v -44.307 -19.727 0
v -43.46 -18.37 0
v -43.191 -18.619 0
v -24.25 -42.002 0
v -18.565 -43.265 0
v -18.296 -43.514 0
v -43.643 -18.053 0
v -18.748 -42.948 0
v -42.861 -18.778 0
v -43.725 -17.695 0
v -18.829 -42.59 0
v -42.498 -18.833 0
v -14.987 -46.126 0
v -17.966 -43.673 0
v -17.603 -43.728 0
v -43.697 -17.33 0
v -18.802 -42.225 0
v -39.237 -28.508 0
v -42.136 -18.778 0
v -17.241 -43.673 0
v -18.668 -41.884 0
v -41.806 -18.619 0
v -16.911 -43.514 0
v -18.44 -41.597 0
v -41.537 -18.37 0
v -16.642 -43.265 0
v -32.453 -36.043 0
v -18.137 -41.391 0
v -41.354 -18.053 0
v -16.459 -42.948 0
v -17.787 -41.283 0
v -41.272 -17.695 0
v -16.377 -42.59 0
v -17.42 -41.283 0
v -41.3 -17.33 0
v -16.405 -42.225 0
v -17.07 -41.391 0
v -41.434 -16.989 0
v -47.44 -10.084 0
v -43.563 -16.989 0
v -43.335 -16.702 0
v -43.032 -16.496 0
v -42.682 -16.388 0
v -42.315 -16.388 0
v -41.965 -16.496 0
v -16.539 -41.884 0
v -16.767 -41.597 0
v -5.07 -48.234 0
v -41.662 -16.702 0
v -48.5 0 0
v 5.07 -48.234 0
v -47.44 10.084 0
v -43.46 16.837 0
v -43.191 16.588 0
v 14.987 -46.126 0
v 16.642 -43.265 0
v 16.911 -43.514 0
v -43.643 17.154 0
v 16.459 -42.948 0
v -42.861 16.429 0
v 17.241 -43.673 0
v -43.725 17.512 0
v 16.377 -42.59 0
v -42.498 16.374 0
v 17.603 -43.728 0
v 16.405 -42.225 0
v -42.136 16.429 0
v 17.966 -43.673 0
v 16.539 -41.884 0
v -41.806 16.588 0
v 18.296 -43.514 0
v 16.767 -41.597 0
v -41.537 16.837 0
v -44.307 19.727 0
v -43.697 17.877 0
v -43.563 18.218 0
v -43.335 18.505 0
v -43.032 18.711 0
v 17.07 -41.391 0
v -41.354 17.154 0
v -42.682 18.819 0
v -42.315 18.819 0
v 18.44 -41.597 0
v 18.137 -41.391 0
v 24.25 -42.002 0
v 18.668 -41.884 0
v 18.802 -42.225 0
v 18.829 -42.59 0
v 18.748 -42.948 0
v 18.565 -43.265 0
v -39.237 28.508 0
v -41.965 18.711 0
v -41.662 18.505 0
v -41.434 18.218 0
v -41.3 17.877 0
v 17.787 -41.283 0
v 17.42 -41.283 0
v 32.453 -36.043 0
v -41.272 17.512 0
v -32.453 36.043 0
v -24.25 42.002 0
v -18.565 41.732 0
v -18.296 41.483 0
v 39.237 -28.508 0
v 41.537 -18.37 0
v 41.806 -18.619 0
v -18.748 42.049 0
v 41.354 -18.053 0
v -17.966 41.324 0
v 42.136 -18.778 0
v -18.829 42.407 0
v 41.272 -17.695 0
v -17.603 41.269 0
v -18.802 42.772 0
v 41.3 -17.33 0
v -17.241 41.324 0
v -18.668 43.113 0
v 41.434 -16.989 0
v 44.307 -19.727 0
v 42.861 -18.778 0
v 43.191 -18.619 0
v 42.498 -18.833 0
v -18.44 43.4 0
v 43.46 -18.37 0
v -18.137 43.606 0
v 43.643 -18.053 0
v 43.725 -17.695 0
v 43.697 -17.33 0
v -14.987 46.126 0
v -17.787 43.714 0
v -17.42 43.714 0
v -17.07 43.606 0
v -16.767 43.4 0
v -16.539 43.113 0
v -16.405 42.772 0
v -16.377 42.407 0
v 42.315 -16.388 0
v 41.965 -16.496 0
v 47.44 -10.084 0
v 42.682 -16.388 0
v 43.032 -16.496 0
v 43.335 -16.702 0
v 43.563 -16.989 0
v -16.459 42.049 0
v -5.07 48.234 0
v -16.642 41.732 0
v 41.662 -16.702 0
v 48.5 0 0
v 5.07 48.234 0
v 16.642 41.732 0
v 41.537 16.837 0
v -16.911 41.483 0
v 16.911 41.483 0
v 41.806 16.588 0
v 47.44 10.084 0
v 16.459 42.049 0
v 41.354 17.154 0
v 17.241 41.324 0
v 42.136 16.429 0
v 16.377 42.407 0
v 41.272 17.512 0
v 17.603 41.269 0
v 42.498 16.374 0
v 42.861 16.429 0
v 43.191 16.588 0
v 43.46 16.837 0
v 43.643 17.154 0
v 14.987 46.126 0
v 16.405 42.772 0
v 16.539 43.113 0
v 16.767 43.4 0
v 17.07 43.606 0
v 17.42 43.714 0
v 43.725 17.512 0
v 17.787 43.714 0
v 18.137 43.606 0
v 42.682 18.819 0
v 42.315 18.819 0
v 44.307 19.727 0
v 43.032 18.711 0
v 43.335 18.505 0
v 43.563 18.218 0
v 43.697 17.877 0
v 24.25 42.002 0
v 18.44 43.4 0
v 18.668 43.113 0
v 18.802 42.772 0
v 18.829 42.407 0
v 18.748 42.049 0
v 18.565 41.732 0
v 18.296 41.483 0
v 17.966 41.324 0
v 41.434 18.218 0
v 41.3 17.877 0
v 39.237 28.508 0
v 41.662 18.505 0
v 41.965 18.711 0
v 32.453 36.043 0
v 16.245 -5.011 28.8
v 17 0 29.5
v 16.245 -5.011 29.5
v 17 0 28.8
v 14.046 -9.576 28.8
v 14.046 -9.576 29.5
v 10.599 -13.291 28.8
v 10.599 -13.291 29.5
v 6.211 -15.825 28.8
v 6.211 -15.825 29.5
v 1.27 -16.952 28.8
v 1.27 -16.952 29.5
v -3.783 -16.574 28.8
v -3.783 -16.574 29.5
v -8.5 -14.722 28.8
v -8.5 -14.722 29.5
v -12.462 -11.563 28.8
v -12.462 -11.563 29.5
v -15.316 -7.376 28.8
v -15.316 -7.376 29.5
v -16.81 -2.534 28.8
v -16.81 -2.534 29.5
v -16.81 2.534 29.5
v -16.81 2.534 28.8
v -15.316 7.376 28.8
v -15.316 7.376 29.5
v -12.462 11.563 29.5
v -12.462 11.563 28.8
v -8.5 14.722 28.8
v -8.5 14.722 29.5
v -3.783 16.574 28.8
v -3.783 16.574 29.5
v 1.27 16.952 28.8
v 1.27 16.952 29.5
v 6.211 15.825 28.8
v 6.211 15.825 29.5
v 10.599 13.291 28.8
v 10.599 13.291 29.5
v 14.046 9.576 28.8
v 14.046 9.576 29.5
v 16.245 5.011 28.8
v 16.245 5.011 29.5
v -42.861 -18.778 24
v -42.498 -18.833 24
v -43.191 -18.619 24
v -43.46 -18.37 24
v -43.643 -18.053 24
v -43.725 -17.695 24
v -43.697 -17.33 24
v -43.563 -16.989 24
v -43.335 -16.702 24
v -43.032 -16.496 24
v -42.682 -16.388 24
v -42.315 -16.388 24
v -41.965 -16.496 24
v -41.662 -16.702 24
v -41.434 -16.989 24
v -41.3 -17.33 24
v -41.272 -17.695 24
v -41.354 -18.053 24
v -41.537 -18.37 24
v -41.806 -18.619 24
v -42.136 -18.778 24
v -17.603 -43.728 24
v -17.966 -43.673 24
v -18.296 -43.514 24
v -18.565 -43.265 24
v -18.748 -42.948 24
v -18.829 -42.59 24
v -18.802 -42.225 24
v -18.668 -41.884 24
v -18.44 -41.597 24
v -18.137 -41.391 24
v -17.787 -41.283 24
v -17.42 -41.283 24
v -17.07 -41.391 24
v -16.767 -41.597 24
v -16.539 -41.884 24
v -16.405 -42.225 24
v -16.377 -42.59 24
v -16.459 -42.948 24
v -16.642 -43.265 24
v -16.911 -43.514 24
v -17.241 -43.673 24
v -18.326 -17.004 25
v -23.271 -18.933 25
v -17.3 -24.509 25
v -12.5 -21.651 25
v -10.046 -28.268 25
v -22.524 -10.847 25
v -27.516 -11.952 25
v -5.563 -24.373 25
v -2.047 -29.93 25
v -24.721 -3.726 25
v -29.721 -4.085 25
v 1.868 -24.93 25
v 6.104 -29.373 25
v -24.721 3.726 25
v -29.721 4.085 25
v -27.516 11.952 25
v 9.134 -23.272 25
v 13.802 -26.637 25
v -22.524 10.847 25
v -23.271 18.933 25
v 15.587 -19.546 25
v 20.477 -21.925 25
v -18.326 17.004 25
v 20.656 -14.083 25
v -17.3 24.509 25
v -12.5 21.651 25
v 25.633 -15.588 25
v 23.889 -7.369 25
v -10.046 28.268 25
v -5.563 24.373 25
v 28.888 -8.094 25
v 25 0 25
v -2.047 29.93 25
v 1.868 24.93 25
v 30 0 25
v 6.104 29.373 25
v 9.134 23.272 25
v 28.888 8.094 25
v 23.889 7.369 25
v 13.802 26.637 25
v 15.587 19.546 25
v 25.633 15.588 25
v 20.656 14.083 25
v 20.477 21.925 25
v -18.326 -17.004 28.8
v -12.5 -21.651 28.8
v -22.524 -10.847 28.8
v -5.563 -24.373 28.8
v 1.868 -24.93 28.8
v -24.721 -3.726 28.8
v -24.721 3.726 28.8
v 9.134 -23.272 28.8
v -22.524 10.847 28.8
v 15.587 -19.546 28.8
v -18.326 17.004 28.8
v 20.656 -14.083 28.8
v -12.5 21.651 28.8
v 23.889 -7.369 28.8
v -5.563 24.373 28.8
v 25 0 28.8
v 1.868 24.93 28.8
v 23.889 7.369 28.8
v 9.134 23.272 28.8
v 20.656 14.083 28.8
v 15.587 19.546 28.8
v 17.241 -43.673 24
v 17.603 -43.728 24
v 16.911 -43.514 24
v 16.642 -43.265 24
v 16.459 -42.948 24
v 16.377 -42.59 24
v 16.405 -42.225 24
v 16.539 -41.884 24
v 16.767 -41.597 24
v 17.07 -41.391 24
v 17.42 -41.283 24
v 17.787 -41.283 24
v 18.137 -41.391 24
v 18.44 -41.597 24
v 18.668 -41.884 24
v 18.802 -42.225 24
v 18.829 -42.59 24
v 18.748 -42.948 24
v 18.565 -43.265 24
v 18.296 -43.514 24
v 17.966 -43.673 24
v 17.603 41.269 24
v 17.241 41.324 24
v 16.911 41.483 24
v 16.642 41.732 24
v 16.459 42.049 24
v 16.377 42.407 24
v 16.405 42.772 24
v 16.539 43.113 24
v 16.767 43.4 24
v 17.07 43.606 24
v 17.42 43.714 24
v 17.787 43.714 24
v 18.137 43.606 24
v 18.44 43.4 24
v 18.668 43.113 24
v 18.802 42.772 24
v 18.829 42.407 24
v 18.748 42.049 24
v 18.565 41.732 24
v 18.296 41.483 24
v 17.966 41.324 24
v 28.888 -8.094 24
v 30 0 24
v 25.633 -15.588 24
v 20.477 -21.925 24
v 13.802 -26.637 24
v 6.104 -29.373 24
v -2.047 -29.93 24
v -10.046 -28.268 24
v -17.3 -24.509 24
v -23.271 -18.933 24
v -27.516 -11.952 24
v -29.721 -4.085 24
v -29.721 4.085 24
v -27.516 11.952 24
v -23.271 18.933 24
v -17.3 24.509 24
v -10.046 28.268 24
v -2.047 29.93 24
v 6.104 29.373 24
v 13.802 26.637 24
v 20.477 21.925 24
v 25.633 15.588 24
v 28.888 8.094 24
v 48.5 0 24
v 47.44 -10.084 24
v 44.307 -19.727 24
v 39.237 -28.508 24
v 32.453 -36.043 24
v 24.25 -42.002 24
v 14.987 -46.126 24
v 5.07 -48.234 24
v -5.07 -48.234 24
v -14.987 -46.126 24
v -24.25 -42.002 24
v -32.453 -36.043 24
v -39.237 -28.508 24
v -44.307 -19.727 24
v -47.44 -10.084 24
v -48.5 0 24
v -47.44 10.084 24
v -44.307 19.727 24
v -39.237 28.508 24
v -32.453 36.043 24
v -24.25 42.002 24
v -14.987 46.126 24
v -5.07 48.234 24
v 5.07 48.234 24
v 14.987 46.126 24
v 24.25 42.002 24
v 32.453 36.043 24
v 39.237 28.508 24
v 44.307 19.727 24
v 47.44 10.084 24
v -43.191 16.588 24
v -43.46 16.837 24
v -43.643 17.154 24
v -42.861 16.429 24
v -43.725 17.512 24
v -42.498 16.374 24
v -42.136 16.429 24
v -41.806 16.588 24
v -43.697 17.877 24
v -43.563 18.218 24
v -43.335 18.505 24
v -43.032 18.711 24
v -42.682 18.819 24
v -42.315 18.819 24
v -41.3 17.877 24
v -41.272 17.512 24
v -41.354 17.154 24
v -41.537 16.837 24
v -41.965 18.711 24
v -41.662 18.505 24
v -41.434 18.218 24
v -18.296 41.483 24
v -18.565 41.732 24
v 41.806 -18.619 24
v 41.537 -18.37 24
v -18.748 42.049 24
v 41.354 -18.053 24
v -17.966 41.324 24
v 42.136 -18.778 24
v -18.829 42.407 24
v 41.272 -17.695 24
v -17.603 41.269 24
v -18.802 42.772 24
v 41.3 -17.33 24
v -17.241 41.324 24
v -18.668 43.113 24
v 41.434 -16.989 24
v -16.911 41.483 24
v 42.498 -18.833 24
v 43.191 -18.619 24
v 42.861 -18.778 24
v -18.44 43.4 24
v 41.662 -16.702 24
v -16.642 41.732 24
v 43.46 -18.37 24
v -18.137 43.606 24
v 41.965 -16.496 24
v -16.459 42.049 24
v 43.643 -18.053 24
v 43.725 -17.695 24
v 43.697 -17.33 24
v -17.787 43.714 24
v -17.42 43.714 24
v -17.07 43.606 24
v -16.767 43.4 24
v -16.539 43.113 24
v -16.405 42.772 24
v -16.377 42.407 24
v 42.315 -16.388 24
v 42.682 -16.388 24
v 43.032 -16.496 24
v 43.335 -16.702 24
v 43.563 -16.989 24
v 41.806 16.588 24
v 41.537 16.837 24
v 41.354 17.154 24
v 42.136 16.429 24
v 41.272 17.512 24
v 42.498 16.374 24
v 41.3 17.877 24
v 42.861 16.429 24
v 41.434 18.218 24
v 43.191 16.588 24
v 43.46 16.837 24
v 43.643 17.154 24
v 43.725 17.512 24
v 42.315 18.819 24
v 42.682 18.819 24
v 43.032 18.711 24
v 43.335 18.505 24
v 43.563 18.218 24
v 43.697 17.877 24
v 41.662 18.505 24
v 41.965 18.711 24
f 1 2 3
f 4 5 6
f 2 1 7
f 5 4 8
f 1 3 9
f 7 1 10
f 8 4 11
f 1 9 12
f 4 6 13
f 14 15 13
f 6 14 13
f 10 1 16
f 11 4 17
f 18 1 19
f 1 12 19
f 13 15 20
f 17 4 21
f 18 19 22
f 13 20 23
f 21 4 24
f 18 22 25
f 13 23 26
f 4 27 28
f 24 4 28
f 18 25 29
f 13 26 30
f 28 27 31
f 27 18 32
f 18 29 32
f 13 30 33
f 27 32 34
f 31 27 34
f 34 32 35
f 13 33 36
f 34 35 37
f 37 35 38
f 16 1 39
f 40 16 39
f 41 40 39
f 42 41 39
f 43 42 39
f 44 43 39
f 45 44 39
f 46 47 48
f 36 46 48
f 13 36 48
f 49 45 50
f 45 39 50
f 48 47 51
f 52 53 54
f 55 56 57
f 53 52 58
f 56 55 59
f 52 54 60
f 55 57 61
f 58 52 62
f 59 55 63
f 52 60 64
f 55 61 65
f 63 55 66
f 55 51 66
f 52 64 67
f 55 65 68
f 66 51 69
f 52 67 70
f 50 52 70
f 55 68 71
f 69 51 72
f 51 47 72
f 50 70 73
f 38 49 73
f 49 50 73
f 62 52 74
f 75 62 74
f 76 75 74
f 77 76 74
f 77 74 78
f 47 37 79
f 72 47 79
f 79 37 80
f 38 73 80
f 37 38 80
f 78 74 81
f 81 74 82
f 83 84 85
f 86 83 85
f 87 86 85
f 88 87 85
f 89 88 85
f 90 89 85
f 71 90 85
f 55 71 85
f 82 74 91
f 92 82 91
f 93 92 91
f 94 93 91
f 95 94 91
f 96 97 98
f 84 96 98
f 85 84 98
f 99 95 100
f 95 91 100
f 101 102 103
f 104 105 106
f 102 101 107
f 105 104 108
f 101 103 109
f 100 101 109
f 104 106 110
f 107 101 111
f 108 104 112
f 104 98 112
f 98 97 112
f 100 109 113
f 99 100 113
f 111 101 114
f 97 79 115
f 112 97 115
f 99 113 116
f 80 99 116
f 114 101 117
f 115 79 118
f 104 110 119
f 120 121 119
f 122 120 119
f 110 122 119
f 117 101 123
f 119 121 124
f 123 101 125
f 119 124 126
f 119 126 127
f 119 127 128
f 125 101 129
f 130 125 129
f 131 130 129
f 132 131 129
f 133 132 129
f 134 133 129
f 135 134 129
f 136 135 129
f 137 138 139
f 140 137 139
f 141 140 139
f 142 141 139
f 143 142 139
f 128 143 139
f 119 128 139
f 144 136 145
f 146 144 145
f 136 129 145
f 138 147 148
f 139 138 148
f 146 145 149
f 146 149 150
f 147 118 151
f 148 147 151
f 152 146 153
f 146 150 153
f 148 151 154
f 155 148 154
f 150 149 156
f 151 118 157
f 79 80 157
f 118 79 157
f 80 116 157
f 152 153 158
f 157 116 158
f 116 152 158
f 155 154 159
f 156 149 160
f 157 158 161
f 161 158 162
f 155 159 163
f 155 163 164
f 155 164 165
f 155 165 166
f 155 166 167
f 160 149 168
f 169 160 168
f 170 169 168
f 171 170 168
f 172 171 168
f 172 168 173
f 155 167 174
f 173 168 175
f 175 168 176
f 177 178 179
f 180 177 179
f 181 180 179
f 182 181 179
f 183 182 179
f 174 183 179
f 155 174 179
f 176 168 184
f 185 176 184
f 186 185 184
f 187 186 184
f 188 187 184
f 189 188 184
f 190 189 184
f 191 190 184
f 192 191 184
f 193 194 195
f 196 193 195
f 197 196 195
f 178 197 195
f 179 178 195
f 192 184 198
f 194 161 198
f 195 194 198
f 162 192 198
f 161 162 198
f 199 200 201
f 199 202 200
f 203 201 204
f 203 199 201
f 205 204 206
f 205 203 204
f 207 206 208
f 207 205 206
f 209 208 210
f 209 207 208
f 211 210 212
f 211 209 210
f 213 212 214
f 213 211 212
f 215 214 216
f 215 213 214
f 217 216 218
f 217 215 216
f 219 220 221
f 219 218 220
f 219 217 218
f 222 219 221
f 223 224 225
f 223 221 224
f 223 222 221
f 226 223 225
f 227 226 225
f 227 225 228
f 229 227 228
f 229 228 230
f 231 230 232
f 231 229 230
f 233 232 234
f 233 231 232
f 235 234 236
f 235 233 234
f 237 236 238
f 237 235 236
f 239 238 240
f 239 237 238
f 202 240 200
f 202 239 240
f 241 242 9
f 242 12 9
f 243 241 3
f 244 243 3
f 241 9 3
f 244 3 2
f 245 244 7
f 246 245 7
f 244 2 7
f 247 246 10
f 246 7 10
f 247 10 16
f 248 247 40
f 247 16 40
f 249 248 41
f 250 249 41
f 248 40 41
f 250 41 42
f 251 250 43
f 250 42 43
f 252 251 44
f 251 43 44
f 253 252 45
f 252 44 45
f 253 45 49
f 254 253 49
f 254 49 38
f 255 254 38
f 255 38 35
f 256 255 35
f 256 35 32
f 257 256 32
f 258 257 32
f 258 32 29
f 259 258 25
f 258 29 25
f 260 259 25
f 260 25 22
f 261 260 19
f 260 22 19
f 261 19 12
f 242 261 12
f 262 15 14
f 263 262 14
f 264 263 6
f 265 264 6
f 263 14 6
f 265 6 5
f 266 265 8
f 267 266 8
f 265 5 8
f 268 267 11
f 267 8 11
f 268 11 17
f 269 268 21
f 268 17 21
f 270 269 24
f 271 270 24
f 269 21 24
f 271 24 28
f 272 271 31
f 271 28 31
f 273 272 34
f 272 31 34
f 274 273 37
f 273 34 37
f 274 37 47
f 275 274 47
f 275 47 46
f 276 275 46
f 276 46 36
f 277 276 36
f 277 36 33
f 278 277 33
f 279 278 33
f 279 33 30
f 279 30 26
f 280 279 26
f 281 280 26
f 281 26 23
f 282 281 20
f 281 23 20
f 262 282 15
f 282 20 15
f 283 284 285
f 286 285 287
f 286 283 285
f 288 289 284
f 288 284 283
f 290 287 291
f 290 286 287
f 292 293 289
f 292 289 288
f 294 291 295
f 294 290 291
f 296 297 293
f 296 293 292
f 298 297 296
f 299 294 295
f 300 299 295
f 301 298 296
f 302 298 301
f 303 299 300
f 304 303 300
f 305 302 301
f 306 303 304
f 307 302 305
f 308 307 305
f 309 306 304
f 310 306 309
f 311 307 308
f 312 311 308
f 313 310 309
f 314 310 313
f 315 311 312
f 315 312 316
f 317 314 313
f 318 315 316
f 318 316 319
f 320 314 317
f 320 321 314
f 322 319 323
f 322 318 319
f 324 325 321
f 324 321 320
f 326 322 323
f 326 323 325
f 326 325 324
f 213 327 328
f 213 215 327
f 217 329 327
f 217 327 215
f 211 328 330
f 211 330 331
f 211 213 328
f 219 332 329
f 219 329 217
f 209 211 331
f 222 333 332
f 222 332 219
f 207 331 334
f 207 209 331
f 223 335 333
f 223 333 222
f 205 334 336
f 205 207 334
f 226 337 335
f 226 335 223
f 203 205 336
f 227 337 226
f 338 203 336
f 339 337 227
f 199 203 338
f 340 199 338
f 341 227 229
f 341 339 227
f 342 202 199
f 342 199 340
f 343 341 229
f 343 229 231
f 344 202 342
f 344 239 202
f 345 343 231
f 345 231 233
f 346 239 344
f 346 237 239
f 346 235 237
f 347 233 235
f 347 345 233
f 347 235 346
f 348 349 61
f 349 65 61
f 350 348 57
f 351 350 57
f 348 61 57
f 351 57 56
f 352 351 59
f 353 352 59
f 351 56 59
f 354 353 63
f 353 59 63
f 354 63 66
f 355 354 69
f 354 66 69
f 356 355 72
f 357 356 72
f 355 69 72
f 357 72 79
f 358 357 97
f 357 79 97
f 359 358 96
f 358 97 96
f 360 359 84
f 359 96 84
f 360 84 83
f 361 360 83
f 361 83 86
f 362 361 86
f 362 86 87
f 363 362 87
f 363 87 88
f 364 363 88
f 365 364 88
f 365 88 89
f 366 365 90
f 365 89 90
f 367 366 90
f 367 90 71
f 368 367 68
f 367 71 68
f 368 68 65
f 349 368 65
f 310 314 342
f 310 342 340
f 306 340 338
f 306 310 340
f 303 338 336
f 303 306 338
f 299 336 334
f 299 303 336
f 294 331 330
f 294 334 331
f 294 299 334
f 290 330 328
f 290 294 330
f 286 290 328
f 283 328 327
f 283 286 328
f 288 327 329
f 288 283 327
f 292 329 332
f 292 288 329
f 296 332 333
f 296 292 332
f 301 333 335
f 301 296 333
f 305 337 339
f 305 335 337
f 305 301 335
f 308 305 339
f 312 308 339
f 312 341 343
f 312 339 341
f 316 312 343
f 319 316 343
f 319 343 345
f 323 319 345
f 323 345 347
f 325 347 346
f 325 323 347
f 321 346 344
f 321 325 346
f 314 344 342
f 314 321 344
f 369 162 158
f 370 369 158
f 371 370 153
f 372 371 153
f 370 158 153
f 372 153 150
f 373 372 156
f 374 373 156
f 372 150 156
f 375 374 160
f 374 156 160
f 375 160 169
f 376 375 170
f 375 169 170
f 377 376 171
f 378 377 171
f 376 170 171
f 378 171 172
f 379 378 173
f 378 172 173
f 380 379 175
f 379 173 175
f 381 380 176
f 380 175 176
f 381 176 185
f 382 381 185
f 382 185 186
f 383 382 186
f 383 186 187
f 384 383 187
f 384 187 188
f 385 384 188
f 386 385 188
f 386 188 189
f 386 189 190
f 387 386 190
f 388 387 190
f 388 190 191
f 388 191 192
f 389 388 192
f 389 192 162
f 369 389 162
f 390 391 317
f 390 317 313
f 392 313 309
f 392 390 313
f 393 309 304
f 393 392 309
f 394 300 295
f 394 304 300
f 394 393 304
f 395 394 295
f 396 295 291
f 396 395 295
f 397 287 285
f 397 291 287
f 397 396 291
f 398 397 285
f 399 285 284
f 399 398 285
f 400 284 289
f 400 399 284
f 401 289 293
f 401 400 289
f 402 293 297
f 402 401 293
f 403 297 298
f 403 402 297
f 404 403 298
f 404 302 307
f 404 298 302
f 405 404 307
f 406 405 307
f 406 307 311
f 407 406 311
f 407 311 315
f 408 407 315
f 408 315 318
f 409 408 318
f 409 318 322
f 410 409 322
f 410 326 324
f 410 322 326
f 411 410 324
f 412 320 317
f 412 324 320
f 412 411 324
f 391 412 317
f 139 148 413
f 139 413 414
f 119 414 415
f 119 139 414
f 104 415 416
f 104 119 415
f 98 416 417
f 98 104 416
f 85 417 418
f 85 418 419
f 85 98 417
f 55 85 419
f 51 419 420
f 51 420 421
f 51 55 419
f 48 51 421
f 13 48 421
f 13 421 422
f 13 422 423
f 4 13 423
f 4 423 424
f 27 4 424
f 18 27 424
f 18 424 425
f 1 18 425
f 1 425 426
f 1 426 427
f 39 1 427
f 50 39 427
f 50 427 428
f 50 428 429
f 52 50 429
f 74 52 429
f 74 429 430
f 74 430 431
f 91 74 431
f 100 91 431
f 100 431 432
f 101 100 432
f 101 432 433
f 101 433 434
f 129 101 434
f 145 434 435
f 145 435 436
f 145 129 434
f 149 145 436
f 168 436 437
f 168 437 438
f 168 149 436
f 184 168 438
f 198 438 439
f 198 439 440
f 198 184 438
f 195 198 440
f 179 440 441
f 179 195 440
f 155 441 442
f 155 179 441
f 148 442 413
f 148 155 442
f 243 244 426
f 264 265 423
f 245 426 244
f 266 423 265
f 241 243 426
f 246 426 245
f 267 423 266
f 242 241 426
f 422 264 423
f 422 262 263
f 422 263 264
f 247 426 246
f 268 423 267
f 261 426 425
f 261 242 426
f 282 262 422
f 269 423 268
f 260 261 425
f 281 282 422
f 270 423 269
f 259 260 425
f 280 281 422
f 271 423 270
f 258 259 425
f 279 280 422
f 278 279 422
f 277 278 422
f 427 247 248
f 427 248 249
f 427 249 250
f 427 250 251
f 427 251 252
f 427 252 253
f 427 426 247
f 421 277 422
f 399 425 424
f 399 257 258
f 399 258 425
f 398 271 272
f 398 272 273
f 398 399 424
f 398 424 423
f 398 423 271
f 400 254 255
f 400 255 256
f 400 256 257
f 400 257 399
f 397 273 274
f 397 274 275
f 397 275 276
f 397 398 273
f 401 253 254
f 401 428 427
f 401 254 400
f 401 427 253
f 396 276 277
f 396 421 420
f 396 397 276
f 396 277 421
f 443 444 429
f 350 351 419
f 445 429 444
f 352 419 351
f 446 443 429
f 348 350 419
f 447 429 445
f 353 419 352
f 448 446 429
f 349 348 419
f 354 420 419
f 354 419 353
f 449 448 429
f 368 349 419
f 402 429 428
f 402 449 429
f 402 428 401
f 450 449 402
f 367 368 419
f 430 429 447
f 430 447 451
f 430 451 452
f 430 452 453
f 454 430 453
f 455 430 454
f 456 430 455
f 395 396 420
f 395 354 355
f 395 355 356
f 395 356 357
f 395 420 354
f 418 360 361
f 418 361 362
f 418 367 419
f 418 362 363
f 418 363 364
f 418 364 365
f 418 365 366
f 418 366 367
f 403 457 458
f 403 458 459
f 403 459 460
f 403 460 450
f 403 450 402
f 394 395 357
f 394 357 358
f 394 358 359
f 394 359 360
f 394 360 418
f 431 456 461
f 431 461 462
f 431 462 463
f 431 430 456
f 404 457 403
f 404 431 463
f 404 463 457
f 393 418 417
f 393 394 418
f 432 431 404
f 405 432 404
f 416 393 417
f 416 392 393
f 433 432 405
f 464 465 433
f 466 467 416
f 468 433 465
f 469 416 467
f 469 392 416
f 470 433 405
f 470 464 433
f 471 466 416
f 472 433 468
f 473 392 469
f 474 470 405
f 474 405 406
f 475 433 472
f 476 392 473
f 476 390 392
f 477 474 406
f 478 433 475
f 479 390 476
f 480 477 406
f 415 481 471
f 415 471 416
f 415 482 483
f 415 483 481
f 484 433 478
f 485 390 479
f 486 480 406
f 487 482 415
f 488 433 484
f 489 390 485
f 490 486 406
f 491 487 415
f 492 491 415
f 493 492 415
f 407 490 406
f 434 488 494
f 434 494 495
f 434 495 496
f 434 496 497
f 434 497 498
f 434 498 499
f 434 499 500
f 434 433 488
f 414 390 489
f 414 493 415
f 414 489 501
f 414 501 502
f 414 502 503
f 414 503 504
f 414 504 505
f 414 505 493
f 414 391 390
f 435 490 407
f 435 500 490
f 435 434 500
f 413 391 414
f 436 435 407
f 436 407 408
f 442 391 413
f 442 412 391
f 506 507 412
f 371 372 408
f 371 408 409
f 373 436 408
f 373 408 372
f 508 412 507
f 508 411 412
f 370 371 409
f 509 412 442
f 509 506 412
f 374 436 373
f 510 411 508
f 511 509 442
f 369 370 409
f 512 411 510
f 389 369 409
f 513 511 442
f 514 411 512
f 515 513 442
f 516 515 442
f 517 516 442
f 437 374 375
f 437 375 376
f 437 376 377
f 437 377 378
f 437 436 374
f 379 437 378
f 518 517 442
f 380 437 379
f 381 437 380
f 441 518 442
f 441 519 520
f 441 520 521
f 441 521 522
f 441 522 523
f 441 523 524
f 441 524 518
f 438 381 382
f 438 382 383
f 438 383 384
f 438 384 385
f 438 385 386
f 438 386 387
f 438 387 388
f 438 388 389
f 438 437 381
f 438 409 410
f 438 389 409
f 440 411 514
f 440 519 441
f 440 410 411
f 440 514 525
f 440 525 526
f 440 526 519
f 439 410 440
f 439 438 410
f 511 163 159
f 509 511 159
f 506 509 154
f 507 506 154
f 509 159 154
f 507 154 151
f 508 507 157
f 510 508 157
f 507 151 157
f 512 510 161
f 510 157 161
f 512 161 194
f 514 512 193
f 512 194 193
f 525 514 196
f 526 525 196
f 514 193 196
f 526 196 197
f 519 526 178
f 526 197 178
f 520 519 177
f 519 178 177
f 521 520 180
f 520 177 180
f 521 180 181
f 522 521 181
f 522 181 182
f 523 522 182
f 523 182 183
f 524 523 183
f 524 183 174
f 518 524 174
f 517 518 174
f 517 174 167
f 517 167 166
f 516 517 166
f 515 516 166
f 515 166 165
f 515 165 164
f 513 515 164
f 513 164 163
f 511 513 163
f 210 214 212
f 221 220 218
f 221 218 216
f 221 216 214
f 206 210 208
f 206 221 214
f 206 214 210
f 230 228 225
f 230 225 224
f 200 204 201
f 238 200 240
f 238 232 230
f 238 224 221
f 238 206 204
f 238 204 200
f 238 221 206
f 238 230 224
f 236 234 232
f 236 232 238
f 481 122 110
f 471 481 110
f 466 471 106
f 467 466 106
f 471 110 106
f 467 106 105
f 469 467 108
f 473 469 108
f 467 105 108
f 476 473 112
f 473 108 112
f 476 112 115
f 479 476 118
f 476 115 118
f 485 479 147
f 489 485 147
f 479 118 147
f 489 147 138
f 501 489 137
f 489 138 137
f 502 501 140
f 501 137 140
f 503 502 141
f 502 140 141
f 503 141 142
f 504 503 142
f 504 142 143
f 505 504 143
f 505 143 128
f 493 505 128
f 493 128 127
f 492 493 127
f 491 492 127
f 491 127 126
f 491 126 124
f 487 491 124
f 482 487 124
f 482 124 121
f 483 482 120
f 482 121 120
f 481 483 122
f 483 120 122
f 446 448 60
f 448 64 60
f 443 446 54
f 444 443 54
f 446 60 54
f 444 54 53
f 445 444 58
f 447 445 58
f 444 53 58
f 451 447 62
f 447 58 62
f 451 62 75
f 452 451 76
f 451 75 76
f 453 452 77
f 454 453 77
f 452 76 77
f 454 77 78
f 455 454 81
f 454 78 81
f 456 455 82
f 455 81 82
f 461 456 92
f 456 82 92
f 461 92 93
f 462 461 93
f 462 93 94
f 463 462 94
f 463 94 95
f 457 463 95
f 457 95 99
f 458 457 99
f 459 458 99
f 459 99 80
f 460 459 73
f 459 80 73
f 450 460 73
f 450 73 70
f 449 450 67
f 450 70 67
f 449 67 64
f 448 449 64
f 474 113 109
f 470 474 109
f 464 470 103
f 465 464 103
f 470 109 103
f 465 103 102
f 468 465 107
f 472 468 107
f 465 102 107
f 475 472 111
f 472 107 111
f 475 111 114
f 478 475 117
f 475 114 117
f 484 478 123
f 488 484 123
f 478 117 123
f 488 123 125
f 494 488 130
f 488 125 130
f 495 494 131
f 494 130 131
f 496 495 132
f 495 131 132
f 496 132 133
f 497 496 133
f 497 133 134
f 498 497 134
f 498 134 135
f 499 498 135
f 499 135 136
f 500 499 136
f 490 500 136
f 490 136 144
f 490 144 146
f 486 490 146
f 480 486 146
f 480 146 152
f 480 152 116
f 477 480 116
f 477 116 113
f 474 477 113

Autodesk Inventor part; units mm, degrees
ref_plane "YZ Plane" through (0, 0, 0) normal (1, 0, 0) x (0, 1, 0)
ref_plane "XZ Plane" through (0, 0, 0) normal (0, 1, 0) x (-1, 0, 0)
ref_plane "XY Plane" through (0, 0, 0) normal (0, 0, 1) x (1, 0, 0)
sketch "スケッチ1" plane through (0, 0, 0) normal (0, 0, 1) x (1, 0, 0)
  circle A0 centre (0, 0) radius 46
  line L0 (0, 54.251) -> (0, -59.4354)
  line L1 (-57.6108, 0) -> (60.5194, 0)
  circle A1 centre (0, 0) radius 48.5
  line L2 (0, 0) -> (-23.2819, 56.2075)
  line L3 (-23.2819, 56.2075) -> (0, 0)
  line L4 (0, 0) -> (23.2706, 56.1801)
  point P0 (-17.6034, 42.4985)
  point P1 (17.6034, 42.4985)
  point P2 (-42.4985, -17.6034)
  point P3 (-42.4985, 17.6034)
  point P4 (17.6034, -42.4985)
  point P5 (-17.6034, -42.4985)
  point P6 (42.4985, 17.6034)
  point P7 (42.4985, -17.6034)
  dimension "d0" = 92
  dimension "d1" = 97
  dimension "d2" = 45
  dimension "d3" = 22.5
  dimension "d6" = 360
extrude "押し出し1" add sketch "スケッチ1" along normal blind 24
sketch "スケッチ2" plane through (0, 0, 24) normal (0, 0, 1) x (1, 0, 0)
  line L0 (0, 68.9903) -> (0, -65.3185)
  circle A0 centre (0, 0) radius 46
  line L1 (0, 0) -> (-21.3879, 51.6351)
  line L2 (-21.3879, 51.6351) -> (0, 0)
  line L3 (0, 0) -> (19.8653, 47.959)
  point P0 (-17.6034, 42.4985)
  point P1 (17.6034, 42.4985)
  point P2 (-42.4985, -17.6034)
  point P3 (-42.4985, 17.6034)
  point P4 (17.6034, -42.4985)
  point P5 (-17.6034, -42.4985)
  point P6 (42.4985, 17.6034)
  point P7 (42.4985, -17.6034)
  dimension "d10" = 92
  dimension "d11" = 45
  dimension "d12" = 22.5
  dimension "d15" = 360
hole "穴1" at (-17.6034, 42.4985, 24) at (17.6034, 42.4985, 24) at (-42.4985, -17.6034, 24) at (-42.4985, 17.6034, 24) at (17.6034, -42.4985, 24) at (-17.6034, -42.4985, 24) at (42.4985, 17.6034, 24) at (42.4985, -17.6034, 24) direction (0, 0, -1) diameter 2.459 end through all thread size "M3x0.5" class "6H" standard "ISO Metric profile"
sketch "スケッチ3" plane through (0, 0, 24) normal (0, 0, 1) x (1, 0, 0)
  circle A0 centre (0, 0) radius 30
  dimension "d24" = 60
extrude "押し出し2" add sketch "スケッチ3" along normal blind 1
sketch "スケッチ4" plane through (0, 0, 25) normal (0, 0, 1) x (1, 0, 0)
  circle A0 centre (0, 0) radius 25
  dimension "d27" = 50
extrude "押し出し3" add sketch "スケッチ4" along normal blind 3.8
sketch "スケッチ5" plane through (0, 0, 28.8) normal (0, 0, 1) x (1, 0, 0)
  circle A0 centre (0, 0) radius 17
  dimension "d30" = 34
extrude "押し出し4" add sketch "スケッチ5" along normal blind 0.7
sketch "スケッチ6" plane through (0, 0, 29.5) normal (0, 0, 1) x (1, 0, 0)
  line L0 (0, 40.5289) -> (0, -45.0936)
  line L1 (-34.581, 0) -> (35.411, 0)
  point P0 (0, 0)
properties part number "GIM8108-8"
